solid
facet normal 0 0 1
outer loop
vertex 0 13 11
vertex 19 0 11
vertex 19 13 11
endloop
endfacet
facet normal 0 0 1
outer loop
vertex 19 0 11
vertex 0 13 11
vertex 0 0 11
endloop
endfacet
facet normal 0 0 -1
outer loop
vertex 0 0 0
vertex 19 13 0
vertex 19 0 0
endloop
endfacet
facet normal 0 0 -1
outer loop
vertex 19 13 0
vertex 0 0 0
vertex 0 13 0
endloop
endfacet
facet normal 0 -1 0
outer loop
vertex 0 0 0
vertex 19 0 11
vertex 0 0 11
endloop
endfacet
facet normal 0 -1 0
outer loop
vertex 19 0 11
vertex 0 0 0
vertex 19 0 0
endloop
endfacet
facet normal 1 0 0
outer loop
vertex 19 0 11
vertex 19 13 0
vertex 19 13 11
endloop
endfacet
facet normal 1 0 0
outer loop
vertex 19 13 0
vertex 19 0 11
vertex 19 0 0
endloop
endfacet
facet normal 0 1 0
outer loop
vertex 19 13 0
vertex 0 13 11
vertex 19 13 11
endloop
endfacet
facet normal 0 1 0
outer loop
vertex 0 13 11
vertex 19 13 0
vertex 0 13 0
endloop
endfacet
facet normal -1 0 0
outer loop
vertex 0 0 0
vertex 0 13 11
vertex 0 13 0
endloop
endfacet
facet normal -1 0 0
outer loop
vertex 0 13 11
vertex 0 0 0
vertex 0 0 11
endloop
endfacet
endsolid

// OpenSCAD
// Generated by SolidPython 1.0.1 on 2020-07-29 00:46:56


cube(size = [19, 13, 11]);
/***********************************************
*********      SolidPython code:      **********
************************************************
 
# import packages: SolidPython
from solid import *
from solid.utils import *
from itertools import chain, combinations, permutations


class Resize:

    def __init__(self, scad_file):
        self.scad_file = scad_file
        #self.scad_file = import_scad(scad_file)
        # cone/cylinder param:
        self.r1 = 0
        self.r2 = 0
        self.h = 0
        # rectangular prism param:
        self.w = 0
        self.l = 0
        # ellipse param:
        self.r = 0

    # import OpenScad code (file name corresponds to shape)


    # classify shape + parameters
    def assign(self, param1, param2, param3):
        if self.scad_file == 'cone.scad':
            self.r1 = param1
            self.r2 = param2
            self.h = param3
        elif self.scad_file == 'cylinder.scad':
            self.r1 = param1
            self.r2 = param2
            self.h = param3
        elif self.scad_file == 'rectangularPrism.scad':
            self.h = param1
            self.l = param2
            self.w = param3
        else:
            self.r = param1
            self.h = param2

    # resize parameters
    def iterate(self):
        x = range(3, 20, 2)
        i = 1
        if self.scad_file == 'cone.scad':
            tempList = list(permutations(x, 2))
            for temp in tempList:
                param1 = temp[0]
                param2 = temp[1]
                filepath = 'produced_scad_files/' + 'cone' + str(param1) + '_' + str(param2) + '_' + '.scad'
                scad_render_to_file(cylinder(h=param1, r1=param2, r2=0), filepath)

        elif self.scad_file == 'cylinder.scad':
            tempList = list(permutations(x, 3))
            for temp in tempList:
                param1 = temp[0]
                param2 = temp[1]
                filepath = 'produced_scad_files/' + 'cylinder' + str(param1) + '_' + str(param2) + '_' + '.scad'
                scad_render_to_file(cylinder(h=param1, r1=param2, r2=param2), filepath)

        elif self.scad_file == 'rectangularPrism.scad':
            tempList = list(permutations(x, 3))
            for temp in tempList:
                param1 = temp[0]
                param2 = temp[1]
                param3 = temp[2]
                filepath = 'produced_scad_files/' + 'rectangularPrism' + str(param1) + '_' + str(param2) + '_' + str(
                    param3) + '.scad'
                scad_render_to_file(cube(size=(param1, param2, param3)), filepath)

        elif self.scad_file == 'ellipse.scad':
            tempList = list(permutations(x, 4))
            for temp in tempList:
                param1 = temp[0]
                param2 = temp[1]
                param3 = temp[2]
                param4 = temp[3]
                filepath = 'produced_scad_files/' + 'ellipse' + str(param1) + '_' + str(param2) + '_' + str(param3) + '_' + str(param4) + '.scad'
                scad_render_to_file(scale([param1, param2, param3])(sphere(r=param4)), filepath)

    def render_to_scadfile(self):
        scad_render_to_file(scad, 'example.scad') 
 
************************************************/
